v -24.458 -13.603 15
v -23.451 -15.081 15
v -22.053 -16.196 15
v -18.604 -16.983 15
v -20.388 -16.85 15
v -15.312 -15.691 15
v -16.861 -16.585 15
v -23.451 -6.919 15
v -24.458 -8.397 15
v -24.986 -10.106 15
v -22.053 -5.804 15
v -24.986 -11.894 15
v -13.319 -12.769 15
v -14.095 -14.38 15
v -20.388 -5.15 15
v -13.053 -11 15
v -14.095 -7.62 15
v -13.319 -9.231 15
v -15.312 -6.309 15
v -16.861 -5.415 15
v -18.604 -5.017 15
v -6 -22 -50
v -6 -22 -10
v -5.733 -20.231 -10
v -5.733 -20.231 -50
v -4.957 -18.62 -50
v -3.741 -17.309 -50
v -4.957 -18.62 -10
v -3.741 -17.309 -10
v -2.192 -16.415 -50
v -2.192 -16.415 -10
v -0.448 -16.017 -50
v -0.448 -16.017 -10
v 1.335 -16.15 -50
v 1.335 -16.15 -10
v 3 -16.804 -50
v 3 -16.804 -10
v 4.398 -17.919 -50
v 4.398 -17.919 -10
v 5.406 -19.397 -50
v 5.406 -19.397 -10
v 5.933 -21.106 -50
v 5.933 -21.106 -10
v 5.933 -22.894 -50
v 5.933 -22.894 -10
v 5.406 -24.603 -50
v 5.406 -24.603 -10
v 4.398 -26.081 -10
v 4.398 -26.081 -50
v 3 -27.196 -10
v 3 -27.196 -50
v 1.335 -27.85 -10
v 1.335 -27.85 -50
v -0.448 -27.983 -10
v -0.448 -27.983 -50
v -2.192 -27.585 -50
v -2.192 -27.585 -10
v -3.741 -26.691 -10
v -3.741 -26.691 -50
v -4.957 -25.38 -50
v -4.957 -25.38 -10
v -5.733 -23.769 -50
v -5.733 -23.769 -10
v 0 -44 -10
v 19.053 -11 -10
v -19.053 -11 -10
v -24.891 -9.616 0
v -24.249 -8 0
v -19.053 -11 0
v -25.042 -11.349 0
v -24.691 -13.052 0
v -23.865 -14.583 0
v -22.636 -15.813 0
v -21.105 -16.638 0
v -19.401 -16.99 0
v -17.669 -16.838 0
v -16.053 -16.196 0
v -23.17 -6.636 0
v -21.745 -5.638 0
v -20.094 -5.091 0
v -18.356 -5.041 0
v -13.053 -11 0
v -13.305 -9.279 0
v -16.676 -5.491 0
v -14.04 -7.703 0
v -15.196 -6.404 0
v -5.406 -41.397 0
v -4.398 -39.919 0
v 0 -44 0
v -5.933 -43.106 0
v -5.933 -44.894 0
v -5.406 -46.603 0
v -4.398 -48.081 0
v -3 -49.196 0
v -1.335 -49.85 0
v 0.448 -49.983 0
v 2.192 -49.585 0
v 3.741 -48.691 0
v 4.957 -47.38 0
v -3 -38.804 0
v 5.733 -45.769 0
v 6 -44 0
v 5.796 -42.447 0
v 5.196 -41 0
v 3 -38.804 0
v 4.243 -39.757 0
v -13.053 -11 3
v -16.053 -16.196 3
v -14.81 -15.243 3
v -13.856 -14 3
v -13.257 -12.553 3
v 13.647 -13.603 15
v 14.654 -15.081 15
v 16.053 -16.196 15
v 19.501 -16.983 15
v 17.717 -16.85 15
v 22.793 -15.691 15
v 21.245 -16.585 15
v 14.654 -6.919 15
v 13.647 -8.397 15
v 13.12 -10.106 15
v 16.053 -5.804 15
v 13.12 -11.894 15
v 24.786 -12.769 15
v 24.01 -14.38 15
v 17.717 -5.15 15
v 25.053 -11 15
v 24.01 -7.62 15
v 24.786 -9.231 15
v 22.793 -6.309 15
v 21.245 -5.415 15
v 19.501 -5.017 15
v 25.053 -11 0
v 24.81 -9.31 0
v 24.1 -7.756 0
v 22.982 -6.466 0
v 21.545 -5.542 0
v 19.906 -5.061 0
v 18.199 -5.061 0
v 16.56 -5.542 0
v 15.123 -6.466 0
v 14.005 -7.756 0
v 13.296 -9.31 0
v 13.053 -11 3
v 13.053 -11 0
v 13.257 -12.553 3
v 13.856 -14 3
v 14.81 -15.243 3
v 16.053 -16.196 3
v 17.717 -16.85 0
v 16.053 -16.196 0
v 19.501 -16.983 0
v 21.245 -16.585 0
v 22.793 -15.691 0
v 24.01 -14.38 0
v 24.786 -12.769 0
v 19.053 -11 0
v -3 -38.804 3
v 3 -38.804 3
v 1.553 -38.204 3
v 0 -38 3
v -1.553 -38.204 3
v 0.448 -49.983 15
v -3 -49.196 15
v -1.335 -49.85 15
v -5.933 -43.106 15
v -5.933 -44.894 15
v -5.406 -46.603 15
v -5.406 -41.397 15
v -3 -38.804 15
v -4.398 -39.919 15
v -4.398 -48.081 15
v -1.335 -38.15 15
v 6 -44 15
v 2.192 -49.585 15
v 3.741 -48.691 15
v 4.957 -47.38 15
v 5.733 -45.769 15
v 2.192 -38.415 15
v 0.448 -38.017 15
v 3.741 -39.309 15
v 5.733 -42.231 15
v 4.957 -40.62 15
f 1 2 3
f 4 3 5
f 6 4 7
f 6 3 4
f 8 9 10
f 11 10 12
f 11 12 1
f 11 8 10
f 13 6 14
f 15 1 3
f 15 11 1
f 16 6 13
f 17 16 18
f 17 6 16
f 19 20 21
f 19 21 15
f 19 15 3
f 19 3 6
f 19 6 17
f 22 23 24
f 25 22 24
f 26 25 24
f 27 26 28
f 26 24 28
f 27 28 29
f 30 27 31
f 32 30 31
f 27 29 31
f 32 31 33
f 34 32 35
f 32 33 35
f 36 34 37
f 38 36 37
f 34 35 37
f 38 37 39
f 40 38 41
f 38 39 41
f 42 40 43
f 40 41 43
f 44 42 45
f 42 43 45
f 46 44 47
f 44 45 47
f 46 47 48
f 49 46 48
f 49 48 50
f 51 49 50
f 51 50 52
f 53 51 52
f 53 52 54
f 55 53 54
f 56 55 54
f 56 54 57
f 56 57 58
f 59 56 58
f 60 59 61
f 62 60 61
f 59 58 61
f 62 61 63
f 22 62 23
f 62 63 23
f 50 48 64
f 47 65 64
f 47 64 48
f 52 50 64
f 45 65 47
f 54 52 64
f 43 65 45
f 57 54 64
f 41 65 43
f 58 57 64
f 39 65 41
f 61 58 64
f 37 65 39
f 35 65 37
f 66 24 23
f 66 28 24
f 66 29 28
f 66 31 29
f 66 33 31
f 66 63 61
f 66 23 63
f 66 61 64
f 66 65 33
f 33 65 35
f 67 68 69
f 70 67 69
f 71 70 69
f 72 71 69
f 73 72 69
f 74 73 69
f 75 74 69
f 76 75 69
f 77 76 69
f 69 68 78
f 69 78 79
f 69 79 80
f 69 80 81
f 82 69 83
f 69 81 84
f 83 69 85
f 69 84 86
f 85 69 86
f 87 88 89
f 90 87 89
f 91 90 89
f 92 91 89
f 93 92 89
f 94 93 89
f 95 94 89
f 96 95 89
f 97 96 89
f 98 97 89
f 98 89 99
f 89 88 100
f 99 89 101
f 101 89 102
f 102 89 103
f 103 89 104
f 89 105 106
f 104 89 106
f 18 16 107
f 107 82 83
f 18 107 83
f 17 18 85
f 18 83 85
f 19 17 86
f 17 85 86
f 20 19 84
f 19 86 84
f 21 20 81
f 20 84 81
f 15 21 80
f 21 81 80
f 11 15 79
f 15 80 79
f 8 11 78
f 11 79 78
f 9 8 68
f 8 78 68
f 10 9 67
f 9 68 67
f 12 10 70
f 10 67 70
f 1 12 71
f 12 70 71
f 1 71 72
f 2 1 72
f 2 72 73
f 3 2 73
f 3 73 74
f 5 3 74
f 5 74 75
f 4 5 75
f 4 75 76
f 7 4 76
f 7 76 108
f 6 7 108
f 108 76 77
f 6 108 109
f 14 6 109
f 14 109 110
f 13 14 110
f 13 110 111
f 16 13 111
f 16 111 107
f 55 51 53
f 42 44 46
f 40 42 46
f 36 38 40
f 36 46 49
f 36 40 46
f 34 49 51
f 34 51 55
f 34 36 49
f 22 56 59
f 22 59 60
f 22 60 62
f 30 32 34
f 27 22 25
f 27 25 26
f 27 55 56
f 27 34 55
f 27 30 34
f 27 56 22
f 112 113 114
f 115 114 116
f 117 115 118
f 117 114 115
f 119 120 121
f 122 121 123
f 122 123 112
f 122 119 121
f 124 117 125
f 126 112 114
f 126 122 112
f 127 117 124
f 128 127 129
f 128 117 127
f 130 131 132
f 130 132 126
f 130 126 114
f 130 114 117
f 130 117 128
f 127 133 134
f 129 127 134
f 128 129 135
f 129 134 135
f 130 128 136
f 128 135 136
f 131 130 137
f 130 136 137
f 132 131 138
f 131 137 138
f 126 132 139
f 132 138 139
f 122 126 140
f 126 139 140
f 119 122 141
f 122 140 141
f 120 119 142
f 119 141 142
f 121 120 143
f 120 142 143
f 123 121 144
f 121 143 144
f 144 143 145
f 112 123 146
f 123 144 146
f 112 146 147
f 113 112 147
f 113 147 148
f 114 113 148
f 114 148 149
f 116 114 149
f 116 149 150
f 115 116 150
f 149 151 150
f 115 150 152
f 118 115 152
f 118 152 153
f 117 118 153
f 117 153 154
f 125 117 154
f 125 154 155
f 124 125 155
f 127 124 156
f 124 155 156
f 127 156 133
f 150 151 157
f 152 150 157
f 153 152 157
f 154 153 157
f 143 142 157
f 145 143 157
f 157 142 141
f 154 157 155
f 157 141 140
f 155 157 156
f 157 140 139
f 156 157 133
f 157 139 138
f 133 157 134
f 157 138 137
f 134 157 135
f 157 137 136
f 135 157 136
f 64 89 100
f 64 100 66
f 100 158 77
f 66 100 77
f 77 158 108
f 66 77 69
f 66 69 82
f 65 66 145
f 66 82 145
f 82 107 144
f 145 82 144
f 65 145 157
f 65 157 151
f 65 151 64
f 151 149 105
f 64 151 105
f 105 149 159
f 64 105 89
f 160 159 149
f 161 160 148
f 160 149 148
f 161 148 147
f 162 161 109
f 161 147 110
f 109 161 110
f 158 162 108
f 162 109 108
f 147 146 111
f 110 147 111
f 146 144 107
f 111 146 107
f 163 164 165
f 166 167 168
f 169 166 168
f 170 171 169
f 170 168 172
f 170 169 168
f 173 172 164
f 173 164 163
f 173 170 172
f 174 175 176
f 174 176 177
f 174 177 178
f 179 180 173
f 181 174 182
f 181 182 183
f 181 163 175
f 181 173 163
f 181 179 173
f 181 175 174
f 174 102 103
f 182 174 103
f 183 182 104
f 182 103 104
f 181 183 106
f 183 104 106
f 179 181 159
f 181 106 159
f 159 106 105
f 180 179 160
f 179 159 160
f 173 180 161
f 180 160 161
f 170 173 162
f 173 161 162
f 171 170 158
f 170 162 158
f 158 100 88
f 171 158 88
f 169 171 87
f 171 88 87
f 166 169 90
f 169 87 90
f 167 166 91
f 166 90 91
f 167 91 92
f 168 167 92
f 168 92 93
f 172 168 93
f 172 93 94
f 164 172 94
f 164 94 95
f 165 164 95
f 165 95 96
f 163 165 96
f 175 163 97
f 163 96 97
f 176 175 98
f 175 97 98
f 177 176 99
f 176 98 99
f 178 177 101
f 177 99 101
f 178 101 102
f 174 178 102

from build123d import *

# Parameters (mm, degrees)
SKETCH1_R             = 6
BOSS_EXTRUDE1_DEPTH   = 15
BOSS_EXTRUDE1_2_DEPTH = 15
BOSS_EXTRUDE1_3_DEPTH = 15
BOSS_EXTRUDE2_START   = -3
BOSS_EXTRUDE2_DEPTH   = 13
SKETCH4_R             = 6
BOSS_EXTRUDE3_DEPTH   = 40


with BuildPart() as part:
    # Sketch1 → Boss-Extrude1 (new body)
    with BuildSketch(Plane.XY):
        with Locations((0, -44)):
            Circle(SKETCH1_R)
    extrude(amount=BOSS_EXTRUDE1_DEPTH)



with BuildPart() as body_2:
    # Sketch1 → Boss-Extrude1 2 (new body)
    with BuildSketch(Plane.XY):
        with Locations((19.052558883, -11)):
            Circle(SKETCH1_R)
    extrude(amount=BOSS_EXTRUDE1_2_DEPTH)


with BuildPart() as body_3:
    # Sketch1 → Boss-Extrude1 3 (new body)
    with BuildSketch(Plane.XY):
        with Locations((-19.052558883, -11)):
            Circle(SKETCH1_R)
    extrude(amount=BOSS_EXTRUDE1_3_DEPTH)


with BuildPart() as part_1:
    add(part.part)

    add(body_2.part)  # Boss-Extrude2 merges body 2

    add(body_3.part)  # Boss-Extrude2 merges body 3
    # Sketch2 → Boss-Extrude2 (add)
    with BuildSketch(Plane(origin=(0, 0, 0), x_dir=(-1, 0, 0), z_dir=(0, 0, -1)).offset(BOSS_EXTRUDE2_START)):
        Polygon((-19.052558883, -11), (0, -44), (19.052558883, -11), align=None)
    extrude(amount=BOSS_EXTRUDE2_DEPTH)

    # Sketch4 → Boss-Extrude3 (add)
    with BuildSketch(Plane(origin=(0, 0, -10), x_dir=(-1, 0, 0), z_dir=(0, 0, -1))):
        with Locations((0, -22)):
            Circle(SKETCH4_R)
    extrude(amount=BOSS_EXTRUDE3_DEPTH)


solid = part_1.part
